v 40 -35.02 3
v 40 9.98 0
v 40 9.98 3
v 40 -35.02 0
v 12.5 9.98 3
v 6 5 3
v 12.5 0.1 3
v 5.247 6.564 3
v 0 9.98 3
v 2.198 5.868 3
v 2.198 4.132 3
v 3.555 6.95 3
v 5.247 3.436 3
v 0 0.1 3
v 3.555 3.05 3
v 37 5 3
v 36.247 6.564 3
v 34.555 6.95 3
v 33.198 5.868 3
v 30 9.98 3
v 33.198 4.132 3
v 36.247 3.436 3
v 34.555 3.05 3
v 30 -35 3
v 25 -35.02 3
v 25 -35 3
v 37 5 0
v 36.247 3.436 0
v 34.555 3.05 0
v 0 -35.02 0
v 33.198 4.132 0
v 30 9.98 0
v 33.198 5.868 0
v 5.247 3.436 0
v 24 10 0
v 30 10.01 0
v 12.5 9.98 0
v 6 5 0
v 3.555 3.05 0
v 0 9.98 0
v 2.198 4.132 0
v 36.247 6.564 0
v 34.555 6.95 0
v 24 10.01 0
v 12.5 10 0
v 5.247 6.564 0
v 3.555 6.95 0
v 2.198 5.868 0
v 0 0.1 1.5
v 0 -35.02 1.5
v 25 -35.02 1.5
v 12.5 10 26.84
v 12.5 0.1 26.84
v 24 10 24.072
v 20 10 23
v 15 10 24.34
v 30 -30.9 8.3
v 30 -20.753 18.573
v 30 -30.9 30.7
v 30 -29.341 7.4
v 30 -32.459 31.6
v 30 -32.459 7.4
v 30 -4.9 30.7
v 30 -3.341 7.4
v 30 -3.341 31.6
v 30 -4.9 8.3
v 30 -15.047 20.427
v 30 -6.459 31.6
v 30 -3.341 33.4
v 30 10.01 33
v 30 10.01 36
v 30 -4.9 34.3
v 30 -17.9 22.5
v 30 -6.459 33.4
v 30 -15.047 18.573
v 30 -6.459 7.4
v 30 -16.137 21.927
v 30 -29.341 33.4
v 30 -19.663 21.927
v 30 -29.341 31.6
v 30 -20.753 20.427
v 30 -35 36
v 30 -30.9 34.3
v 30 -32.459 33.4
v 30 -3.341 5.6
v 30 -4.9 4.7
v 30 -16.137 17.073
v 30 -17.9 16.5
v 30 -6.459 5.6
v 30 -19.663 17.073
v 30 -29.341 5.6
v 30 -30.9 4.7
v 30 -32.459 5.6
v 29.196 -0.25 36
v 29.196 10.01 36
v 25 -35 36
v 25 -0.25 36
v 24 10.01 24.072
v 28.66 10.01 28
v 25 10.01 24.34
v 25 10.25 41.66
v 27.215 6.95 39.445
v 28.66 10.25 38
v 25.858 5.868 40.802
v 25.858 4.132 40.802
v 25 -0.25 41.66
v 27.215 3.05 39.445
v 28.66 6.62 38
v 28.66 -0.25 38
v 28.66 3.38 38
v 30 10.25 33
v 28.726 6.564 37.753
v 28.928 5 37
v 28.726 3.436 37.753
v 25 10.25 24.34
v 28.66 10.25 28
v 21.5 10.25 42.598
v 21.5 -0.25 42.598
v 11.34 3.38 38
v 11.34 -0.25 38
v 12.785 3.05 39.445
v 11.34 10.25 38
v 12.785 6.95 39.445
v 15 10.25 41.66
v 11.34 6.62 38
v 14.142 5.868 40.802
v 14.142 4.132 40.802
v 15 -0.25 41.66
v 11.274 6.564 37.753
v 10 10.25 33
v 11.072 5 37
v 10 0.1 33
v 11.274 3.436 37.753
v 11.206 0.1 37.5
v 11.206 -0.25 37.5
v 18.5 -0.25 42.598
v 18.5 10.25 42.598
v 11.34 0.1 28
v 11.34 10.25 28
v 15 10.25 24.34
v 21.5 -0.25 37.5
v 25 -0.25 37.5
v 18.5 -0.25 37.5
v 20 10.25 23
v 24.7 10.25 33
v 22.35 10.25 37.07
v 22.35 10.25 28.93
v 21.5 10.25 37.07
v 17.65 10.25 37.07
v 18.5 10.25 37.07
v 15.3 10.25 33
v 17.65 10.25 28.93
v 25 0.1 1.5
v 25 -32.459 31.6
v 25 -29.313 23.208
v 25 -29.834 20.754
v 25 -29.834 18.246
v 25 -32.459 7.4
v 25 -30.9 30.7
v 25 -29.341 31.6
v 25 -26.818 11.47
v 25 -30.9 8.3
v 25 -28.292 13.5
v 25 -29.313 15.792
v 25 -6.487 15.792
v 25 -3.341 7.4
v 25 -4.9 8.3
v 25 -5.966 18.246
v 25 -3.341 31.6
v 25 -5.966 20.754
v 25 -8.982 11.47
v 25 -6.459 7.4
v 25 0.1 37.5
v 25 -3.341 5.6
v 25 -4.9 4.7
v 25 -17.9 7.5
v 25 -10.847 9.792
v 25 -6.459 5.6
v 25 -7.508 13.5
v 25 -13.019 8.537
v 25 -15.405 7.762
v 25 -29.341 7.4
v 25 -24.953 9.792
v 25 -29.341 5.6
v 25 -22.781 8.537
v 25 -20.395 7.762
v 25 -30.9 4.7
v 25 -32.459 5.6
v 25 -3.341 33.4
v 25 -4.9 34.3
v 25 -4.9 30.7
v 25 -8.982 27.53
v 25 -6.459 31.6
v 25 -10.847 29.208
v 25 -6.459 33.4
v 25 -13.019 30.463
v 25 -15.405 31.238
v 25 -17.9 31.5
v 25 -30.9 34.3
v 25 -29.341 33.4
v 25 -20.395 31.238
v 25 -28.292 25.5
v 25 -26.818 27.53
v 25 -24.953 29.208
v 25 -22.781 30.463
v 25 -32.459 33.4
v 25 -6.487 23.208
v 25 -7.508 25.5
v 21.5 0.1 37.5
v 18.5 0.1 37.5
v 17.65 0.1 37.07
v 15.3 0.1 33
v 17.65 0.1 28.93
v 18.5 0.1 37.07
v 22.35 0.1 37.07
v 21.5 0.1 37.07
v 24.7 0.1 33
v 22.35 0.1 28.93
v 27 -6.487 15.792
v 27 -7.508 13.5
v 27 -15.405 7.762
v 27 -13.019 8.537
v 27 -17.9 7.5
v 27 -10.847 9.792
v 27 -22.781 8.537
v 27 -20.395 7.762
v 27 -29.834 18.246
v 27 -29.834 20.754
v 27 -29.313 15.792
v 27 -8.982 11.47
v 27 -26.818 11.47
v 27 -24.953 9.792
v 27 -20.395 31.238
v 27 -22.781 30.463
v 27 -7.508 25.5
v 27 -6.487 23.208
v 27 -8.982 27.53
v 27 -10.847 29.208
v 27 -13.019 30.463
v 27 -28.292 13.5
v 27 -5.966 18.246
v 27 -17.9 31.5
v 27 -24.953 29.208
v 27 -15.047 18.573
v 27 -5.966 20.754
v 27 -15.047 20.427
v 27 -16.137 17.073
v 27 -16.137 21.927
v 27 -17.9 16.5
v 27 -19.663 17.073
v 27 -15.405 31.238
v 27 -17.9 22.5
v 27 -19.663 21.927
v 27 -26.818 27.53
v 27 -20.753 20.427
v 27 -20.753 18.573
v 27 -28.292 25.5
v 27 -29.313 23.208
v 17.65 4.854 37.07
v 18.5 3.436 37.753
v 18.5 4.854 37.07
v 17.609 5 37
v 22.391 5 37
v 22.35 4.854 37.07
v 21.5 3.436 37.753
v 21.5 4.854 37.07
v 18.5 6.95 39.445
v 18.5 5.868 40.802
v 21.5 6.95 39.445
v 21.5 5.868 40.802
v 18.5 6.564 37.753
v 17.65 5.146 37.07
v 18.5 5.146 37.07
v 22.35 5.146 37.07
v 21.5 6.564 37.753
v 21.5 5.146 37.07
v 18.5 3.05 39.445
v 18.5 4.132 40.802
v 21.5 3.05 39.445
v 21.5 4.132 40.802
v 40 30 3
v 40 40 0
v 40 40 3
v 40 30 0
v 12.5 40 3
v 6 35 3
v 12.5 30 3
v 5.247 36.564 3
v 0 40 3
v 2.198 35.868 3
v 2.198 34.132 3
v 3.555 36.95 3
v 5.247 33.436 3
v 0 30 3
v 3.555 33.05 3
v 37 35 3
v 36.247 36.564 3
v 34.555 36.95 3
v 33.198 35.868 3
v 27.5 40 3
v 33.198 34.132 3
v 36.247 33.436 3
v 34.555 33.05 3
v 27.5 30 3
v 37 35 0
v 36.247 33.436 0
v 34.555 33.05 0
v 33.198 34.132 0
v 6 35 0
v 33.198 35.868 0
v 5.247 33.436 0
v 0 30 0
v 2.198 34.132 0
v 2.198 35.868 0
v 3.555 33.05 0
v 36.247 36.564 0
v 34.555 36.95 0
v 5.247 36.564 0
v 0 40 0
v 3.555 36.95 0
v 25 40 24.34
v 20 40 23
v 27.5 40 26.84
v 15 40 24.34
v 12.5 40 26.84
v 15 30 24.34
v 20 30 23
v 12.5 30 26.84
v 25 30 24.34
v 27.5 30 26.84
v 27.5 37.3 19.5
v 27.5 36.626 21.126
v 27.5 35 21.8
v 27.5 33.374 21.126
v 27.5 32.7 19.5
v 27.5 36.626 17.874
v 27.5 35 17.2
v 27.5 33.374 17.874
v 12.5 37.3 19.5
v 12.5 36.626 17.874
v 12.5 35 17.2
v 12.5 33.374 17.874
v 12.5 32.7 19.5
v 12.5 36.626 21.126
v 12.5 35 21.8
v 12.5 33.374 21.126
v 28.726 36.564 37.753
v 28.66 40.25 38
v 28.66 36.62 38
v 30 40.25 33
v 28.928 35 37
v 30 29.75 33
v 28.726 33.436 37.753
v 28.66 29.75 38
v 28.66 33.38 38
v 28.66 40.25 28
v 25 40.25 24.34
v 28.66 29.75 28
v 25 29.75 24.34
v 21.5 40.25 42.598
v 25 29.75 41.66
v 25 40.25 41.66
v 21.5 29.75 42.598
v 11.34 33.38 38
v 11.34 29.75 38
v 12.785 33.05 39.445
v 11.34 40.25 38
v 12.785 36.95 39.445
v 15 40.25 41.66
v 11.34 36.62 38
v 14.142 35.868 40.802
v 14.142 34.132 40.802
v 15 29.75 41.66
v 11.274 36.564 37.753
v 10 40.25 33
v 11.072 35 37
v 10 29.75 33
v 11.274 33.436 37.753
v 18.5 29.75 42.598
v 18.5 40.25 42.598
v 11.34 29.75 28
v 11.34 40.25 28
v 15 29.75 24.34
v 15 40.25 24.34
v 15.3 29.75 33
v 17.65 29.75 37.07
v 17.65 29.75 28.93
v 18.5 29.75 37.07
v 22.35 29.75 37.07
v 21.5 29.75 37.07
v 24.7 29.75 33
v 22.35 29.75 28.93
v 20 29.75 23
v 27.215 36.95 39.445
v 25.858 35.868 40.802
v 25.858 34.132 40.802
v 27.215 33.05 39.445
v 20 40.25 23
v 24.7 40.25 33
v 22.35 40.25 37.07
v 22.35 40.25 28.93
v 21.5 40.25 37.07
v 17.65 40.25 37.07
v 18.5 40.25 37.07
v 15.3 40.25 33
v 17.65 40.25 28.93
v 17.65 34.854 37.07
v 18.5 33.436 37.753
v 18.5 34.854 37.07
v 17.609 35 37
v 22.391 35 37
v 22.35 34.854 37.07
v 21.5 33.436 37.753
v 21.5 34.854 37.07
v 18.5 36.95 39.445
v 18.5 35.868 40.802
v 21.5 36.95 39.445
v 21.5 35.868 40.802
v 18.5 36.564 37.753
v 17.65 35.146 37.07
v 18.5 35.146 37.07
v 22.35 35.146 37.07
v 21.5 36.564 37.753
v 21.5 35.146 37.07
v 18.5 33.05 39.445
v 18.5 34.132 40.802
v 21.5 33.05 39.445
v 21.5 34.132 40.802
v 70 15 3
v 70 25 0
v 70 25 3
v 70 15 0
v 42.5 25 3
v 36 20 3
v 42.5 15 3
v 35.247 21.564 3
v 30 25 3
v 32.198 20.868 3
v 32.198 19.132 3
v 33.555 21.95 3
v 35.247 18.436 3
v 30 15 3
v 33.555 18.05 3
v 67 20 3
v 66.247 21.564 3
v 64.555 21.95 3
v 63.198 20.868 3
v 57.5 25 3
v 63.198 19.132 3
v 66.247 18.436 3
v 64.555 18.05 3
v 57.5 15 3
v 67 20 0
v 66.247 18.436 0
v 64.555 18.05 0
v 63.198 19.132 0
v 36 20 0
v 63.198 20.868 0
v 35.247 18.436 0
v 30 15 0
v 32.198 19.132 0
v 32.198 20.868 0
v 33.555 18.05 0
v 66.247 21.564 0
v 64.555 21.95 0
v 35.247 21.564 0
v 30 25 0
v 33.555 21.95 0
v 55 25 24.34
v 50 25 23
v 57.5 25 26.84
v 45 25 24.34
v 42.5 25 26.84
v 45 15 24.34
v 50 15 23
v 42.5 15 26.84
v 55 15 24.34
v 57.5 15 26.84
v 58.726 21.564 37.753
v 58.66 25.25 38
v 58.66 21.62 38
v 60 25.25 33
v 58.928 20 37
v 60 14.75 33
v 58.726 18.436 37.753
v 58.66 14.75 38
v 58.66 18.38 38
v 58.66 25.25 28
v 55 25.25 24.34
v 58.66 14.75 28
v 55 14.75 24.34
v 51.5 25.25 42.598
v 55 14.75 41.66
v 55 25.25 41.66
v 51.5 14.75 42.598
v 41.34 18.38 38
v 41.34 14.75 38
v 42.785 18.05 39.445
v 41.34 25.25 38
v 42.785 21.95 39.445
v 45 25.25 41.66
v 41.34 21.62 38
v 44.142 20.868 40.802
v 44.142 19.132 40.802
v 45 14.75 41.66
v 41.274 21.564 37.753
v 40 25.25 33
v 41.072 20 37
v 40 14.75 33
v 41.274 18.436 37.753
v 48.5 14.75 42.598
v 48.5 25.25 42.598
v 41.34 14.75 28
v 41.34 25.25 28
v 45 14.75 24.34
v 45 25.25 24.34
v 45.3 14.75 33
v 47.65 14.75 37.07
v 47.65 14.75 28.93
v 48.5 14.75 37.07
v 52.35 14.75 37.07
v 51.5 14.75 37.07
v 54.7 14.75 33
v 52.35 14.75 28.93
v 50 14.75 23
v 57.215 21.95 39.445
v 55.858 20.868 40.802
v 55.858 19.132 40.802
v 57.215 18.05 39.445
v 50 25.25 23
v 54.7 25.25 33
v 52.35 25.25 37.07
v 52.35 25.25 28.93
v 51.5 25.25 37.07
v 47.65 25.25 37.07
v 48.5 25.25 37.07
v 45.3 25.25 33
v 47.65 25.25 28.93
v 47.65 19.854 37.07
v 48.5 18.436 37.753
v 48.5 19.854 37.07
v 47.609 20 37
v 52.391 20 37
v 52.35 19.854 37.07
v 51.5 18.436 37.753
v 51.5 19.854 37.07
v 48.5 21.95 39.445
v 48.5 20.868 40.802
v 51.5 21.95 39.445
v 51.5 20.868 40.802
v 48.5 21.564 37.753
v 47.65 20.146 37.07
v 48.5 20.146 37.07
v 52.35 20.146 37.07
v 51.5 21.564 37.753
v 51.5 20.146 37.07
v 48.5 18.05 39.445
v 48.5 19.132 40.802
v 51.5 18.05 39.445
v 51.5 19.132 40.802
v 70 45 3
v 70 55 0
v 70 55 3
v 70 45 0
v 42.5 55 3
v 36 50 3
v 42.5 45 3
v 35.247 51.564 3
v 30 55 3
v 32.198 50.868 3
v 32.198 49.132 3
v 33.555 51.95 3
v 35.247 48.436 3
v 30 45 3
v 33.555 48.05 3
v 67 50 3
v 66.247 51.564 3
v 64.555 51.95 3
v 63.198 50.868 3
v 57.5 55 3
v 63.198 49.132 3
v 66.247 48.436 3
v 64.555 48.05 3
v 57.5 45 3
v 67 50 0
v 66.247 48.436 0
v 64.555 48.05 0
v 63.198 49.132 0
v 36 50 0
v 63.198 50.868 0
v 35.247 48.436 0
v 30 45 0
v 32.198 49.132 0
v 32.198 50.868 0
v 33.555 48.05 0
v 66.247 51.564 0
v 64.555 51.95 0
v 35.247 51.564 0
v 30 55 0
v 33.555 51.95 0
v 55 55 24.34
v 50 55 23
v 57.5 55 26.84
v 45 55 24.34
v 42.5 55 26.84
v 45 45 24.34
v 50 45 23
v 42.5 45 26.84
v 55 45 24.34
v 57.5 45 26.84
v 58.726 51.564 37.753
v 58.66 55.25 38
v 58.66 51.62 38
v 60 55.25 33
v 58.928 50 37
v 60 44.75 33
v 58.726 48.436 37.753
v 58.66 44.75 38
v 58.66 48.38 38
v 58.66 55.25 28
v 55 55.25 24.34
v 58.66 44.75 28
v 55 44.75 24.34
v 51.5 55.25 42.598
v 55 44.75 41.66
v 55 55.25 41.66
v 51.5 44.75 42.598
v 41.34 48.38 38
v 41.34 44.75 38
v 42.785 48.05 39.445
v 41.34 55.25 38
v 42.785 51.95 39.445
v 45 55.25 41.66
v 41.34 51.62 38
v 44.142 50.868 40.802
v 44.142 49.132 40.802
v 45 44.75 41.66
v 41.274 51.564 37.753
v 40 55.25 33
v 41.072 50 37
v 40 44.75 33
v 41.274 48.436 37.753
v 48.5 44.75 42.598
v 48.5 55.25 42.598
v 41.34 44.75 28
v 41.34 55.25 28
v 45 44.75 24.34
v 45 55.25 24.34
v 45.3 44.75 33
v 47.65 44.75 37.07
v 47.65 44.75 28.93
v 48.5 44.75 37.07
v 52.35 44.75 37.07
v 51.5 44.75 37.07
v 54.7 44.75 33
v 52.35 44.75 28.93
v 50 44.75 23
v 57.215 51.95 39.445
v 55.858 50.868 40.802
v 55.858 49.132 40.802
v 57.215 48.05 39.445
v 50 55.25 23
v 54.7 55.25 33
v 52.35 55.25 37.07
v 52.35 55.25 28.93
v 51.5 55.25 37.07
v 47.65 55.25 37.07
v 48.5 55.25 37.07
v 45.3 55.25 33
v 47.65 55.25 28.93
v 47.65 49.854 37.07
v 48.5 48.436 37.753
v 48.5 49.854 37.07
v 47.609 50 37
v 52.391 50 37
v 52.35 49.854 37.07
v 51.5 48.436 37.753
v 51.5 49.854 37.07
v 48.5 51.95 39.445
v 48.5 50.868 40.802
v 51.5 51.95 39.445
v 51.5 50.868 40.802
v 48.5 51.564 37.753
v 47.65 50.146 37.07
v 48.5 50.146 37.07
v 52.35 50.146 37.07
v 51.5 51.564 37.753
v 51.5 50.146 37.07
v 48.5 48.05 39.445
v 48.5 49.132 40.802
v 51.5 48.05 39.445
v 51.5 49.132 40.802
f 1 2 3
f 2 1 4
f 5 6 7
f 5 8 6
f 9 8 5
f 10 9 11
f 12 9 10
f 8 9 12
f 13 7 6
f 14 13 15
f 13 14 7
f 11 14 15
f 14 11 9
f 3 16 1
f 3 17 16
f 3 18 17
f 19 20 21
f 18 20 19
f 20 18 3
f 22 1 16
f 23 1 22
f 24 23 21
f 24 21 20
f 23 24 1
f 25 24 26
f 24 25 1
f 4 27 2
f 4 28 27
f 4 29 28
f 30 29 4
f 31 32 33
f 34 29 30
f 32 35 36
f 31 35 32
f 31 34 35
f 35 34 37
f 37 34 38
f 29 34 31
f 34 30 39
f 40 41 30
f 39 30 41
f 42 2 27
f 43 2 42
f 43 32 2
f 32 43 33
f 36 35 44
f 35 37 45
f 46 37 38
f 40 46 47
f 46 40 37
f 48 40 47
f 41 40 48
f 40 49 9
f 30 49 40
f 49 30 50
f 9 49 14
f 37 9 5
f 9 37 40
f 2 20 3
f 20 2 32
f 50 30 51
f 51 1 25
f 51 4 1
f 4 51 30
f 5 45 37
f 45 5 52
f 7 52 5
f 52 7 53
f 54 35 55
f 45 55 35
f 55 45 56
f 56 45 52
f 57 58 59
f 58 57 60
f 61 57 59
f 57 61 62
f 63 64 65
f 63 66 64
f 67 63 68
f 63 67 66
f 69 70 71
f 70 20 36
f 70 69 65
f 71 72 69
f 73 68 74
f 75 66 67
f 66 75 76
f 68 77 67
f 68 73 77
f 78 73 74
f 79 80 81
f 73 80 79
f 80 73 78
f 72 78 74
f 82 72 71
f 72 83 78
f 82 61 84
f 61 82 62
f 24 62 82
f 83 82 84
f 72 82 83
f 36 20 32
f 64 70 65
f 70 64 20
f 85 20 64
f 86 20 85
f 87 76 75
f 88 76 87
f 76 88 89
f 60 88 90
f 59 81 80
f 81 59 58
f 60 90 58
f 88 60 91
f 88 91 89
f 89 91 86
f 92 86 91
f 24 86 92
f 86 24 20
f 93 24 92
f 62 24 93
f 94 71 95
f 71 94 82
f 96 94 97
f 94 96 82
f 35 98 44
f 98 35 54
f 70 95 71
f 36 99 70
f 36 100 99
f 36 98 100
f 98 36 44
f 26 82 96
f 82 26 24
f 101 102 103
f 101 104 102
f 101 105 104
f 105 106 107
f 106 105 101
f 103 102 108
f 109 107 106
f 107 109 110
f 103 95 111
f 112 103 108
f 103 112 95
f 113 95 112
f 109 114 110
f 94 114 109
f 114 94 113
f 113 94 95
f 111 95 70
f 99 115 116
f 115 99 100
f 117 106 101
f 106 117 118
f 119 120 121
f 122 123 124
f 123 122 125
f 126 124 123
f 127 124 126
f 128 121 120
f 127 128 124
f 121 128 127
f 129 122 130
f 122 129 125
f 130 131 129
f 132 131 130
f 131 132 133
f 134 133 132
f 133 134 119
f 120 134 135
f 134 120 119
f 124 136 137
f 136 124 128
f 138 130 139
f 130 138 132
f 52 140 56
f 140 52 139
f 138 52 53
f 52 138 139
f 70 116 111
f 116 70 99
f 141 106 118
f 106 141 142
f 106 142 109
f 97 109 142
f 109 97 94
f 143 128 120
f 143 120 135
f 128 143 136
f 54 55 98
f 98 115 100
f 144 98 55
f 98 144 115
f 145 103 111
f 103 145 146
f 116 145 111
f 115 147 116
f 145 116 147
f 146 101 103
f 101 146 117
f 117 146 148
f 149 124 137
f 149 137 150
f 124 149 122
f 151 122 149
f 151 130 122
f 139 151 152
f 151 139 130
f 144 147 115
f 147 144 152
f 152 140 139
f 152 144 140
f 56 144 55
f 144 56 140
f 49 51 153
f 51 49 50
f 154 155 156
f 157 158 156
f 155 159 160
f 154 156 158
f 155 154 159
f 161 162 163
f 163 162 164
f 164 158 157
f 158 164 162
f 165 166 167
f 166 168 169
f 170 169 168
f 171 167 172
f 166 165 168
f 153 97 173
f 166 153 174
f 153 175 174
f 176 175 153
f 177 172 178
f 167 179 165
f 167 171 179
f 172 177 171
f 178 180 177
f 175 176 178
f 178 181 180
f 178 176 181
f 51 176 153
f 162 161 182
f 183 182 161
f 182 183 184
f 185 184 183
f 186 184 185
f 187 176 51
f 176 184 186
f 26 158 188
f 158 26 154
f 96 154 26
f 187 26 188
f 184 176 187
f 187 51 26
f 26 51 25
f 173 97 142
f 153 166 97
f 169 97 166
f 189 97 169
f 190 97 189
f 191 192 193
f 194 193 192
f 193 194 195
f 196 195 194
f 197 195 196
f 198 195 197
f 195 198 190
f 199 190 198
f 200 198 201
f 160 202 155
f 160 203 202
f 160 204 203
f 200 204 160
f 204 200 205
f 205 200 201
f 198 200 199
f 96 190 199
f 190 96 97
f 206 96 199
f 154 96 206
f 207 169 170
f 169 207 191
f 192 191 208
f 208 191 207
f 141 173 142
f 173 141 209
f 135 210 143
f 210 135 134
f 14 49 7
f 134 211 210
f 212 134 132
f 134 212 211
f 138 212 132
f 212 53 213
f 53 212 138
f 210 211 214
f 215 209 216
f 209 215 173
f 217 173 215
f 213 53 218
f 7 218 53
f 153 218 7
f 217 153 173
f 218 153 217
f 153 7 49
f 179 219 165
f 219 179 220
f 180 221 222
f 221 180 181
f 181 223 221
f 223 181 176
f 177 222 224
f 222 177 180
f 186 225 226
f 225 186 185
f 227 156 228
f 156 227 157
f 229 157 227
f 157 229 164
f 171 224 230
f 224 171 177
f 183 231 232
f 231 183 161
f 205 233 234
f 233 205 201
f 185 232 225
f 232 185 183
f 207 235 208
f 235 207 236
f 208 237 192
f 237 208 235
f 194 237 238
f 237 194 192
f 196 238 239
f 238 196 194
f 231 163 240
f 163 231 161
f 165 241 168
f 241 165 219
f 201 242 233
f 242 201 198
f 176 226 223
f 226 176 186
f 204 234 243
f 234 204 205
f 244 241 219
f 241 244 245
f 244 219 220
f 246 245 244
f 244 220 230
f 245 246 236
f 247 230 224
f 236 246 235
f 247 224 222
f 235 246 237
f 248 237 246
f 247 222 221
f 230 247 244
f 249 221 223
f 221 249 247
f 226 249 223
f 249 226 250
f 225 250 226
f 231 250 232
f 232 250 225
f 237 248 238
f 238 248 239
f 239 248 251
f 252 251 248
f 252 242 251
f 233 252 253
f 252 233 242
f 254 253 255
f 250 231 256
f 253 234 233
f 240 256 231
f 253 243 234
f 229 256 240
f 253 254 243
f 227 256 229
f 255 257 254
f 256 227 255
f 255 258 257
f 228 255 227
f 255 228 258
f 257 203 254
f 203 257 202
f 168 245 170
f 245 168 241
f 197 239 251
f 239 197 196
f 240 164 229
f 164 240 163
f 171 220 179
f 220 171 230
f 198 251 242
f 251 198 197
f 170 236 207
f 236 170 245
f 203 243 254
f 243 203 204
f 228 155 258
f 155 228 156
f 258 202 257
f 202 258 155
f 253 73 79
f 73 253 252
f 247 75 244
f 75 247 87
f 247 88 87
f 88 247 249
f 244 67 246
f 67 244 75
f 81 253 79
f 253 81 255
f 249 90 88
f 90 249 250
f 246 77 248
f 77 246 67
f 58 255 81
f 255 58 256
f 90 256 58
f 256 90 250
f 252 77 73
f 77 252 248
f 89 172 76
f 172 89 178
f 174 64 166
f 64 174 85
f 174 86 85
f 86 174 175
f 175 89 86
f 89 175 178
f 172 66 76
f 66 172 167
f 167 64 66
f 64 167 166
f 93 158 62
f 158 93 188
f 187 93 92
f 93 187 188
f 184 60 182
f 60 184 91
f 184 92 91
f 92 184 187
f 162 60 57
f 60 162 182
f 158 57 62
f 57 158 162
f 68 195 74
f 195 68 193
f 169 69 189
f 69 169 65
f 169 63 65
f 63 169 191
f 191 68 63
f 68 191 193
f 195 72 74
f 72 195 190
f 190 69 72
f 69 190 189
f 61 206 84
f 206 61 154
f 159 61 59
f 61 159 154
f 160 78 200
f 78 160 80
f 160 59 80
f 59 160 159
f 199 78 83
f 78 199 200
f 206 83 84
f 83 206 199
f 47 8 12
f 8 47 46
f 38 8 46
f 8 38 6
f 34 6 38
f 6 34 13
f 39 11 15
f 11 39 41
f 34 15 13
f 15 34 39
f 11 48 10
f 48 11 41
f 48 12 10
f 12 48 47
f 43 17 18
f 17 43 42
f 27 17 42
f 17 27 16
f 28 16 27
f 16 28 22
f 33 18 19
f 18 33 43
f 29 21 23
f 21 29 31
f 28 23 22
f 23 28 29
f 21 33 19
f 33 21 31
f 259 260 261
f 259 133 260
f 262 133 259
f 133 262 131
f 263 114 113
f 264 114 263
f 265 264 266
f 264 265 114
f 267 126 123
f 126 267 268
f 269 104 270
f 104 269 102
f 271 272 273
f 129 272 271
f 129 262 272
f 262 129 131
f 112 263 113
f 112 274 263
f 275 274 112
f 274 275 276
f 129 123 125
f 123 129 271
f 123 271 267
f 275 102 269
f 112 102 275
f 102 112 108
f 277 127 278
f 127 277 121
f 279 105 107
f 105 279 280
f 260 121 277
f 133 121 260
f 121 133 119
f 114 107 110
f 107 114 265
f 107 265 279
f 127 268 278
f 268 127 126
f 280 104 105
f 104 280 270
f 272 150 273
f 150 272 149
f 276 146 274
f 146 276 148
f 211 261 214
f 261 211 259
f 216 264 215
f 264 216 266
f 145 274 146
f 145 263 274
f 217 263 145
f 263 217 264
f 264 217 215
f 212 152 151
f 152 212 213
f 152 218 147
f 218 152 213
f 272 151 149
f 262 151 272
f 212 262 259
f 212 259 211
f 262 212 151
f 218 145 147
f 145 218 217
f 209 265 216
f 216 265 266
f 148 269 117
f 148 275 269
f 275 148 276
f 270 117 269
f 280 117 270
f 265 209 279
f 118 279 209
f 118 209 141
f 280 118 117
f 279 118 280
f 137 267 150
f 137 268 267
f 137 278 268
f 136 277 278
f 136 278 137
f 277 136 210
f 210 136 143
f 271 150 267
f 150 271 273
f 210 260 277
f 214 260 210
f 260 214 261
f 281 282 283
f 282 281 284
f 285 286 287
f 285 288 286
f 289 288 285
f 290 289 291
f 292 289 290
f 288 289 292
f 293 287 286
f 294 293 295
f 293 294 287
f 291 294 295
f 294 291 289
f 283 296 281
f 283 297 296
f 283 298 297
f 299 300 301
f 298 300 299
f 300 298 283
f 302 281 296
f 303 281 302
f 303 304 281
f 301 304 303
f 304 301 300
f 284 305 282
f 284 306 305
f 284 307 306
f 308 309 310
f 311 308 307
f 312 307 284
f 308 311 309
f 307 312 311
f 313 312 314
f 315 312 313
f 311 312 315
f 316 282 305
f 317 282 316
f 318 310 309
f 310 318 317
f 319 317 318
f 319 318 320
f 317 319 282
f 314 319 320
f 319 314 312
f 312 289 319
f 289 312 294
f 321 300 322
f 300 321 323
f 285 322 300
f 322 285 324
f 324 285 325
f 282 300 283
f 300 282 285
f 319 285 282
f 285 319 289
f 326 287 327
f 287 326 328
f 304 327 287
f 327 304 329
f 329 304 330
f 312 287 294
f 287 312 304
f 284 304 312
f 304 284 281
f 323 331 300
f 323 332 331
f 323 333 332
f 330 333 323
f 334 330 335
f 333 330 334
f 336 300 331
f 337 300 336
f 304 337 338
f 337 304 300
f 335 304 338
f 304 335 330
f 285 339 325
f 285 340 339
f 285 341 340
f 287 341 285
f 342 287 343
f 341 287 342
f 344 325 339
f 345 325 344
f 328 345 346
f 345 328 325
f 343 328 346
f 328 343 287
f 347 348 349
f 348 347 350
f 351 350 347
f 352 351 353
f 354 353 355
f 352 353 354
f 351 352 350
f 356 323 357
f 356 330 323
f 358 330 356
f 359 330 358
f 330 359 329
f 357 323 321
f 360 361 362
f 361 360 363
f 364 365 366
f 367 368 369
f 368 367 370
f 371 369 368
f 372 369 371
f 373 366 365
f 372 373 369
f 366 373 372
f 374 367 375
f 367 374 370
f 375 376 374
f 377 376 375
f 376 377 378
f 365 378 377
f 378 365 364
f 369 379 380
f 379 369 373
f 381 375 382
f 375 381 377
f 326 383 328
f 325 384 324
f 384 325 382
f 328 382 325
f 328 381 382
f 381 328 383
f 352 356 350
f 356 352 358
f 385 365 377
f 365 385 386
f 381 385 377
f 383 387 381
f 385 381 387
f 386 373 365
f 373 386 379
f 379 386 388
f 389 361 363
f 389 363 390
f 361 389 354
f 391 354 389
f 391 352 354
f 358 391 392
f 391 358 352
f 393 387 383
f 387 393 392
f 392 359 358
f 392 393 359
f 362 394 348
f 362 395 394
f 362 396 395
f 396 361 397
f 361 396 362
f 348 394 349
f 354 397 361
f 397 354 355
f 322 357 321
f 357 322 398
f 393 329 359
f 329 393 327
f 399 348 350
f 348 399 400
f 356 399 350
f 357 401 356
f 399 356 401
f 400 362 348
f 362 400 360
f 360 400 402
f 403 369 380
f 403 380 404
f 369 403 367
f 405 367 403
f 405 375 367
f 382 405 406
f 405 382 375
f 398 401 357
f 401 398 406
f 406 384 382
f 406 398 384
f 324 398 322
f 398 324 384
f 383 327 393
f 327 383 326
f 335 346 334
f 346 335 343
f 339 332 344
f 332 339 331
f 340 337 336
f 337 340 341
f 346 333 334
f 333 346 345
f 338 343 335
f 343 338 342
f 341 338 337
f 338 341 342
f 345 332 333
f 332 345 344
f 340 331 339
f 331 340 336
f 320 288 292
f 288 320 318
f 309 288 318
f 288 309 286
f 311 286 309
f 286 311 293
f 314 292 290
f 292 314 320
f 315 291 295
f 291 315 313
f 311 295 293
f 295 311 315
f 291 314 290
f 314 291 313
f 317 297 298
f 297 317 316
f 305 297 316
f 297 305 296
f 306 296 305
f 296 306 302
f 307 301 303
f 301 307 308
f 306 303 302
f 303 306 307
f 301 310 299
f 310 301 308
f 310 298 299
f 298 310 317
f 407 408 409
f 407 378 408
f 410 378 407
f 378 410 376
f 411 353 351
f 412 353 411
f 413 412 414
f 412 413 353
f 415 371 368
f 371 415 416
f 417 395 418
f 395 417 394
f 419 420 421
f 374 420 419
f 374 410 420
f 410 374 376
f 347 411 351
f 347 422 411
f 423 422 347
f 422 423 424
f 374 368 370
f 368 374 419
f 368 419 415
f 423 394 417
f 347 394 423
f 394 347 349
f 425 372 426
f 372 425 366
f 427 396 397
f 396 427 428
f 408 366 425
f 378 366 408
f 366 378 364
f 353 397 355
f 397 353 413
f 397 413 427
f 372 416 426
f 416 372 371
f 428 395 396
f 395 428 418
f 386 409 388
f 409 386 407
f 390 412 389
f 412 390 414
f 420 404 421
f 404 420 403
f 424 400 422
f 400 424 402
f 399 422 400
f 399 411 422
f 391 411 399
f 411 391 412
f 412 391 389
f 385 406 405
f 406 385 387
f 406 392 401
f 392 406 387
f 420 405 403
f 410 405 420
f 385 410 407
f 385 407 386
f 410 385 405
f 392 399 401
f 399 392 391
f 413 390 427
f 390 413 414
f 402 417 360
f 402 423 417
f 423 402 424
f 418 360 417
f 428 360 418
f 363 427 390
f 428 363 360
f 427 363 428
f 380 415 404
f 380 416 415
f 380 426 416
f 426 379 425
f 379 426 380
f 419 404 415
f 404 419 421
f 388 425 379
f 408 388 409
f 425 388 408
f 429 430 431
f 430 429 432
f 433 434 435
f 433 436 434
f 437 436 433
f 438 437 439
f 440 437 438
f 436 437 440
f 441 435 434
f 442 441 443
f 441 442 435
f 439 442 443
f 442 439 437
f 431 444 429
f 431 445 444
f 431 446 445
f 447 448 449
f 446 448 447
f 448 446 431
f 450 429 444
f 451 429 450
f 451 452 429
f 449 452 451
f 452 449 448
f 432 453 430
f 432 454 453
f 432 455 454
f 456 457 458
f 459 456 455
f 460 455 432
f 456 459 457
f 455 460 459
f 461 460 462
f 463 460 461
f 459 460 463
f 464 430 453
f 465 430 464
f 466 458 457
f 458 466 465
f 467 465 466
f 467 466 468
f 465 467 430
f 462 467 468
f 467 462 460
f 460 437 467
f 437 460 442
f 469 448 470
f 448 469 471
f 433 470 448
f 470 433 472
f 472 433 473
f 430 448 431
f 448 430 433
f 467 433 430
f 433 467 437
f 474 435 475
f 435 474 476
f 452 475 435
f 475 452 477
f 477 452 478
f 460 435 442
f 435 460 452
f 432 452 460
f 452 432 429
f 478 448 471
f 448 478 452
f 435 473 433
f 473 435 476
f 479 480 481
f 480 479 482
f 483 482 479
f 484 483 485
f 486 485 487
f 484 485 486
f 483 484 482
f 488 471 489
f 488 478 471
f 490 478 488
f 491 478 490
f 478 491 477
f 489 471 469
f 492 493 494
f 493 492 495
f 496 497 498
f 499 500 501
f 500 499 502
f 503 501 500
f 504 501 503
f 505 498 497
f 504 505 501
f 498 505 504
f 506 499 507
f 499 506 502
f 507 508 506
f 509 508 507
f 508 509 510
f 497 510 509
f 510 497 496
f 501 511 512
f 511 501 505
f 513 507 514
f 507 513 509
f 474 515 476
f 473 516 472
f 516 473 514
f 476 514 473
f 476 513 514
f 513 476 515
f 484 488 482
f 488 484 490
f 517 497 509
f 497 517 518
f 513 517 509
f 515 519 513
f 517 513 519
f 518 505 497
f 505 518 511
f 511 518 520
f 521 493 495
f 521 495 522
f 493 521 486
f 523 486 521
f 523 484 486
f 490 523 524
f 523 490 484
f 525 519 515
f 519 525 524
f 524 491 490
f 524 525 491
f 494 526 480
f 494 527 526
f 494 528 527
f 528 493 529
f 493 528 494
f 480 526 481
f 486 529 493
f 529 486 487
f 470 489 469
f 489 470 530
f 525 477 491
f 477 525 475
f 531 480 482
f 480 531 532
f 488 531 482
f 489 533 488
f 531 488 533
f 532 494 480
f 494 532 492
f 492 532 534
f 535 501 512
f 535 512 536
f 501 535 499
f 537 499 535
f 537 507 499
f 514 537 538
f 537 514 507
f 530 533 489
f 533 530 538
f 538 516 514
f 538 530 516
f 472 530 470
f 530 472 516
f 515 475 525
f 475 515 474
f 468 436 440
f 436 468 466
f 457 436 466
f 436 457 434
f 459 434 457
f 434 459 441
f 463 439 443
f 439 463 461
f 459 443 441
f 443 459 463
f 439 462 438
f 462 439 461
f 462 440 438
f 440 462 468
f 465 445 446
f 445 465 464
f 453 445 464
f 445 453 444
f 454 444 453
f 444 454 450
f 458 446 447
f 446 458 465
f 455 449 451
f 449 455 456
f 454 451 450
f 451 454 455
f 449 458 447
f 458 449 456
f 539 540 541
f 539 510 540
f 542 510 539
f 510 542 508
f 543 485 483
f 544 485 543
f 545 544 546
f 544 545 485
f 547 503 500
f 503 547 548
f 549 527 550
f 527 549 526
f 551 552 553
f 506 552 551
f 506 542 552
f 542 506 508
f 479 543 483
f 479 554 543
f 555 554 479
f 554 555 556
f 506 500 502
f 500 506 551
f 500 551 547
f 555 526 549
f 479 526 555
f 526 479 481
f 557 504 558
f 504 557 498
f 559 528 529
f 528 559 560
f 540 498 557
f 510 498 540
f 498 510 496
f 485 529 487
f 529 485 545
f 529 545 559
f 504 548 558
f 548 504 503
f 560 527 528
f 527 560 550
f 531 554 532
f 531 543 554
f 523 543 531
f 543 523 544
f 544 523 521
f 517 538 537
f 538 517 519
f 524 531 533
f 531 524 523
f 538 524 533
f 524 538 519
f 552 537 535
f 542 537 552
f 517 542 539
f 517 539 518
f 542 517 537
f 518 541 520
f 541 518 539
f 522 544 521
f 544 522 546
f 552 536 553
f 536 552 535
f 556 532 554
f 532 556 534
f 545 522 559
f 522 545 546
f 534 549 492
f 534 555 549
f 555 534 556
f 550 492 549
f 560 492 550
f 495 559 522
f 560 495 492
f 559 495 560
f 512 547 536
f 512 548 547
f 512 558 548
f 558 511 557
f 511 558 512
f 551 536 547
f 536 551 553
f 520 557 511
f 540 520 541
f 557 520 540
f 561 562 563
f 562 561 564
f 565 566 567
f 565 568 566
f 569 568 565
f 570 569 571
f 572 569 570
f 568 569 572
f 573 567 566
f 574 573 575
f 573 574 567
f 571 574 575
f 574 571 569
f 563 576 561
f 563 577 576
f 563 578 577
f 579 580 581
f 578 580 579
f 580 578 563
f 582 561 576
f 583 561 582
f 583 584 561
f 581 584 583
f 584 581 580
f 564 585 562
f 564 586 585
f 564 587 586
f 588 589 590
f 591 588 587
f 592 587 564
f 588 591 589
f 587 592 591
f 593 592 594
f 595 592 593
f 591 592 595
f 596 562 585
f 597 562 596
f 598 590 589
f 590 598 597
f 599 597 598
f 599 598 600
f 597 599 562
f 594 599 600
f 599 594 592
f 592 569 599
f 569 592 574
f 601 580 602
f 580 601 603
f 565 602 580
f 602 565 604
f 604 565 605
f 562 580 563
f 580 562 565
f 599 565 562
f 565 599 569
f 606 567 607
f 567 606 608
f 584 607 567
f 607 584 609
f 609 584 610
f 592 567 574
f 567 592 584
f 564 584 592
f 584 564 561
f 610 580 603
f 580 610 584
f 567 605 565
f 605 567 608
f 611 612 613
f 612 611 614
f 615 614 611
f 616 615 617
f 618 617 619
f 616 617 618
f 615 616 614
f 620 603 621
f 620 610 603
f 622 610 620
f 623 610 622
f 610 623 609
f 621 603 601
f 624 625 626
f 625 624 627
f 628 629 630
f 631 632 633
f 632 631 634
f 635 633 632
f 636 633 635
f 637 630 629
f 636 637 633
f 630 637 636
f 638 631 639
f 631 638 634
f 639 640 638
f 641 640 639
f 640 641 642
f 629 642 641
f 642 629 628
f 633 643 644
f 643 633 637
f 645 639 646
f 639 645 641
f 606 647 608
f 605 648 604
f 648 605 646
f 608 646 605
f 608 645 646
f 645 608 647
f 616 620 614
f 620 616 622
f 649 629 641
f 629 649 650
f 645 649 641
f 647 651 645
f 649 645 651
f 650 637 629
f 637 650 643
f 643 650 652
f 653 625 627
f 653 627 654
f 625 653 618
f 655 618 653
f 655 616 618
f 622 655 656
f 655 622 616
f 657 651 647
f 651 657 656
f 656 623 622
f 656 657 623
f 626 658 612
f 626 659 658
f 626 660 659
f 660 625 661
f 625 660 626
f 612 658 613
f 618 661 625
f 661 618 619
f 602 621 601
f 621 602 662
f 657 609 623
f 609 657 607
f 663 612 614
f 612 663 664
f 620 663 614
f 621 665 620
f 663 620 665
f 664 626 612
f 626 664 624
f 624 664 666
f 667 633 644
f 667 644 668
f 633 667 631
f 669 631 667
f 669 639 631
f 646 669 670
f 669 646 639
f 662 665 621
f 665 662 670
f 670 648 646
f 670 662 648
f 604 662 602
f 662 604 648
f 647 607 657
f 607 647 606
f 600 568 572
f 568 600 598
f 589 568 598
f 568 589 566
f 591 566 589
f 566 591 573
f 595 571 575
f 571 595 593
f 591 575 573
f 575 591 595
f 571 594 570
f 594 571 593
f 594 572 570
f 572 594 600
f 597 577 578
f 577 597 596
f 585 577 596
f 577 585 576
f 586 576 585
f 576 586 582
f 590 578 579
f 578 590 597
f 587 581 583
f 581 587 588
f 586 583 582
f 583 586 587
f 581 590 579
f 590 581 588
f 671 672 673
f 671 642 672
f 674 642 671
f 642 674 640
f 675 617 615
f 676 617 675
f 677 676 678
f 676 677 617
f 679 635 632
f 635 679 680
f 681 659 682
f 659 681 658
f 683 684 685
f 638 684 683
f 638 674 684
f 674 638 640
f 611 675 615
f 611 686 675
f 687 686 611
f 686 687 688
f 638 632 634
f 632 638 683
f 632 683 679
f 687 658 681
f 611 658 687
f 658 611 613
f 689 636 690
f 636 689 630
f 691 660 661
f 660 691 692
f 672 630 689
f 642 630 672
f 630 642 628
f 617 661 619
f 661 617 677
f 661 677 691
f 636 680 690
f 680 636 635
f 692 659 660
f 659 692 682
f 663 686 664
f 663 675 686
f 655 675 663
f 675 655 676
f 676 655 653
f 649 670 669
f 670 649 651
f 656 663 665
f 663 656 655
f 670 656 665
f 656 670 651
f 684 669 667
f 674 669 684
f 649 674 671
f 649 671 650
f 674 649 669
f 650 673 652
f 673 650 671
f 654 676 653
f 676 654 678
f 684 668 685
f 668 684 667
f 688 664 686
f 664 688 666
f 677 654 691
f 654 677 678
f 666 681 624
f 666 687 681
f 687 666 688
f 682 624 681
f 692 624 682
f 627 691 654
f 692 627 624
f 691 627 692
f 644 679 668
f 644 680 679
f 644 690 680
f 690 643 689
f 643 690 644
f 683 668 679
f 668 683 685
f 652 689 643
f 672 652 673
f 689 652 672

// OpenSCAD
module nema14(){
cube([36,36,40],true);
translate([0,0,1])cylinder(r=12,h=42,center=true);
translate([0,0,1])cylinder(r=3,h=38);
translate([13,13,1])cylinder(r=1.8,h=38);
translate([13,-13,1])cylinder(r=1.8,h=38);
translate([-13,13,1])cylinder(r=1.8,h=38);
translate([-13,-13,1])cylinder(r=1.8,h=38);

}

module shaftholder(){
difference(){
union(){cube([40,10,3]);
translate([12.5,0])cube([15,10,30]);
translate([20,10.25,20+13])rotate([90,0,0])cylinder(r=10,h=10.5,$fn=12);

}
translate([4,5,-0.1])cylinder(r=2,h=10);
translate([35,5,-0.1])cylinder(r=2,h=10);
translate([5,5,26+13])rotate([0,90,0])cylinder(r=2,h=30);
translate([20,10.5,20+13])rotate([90,0,0])cylinder(r=4.7,h=11,$fn=6);
translate([18.5,-2.1,20+13])rotate([0,0,0])cube([3,13,30]);

}
}
module ishaftholder(){
difference(){
union(){cube([40,10,3]);
translate([12.5,0])cube([15,10,30]);
translate([20,10.25,20+13])rotate([90,0,0])cylinder(r=10,h=10.5,$fn=12);

}
translate([5,5,19.5])rotate([0,90,0])cylinder(r=2.3,h=30);
translate([4,5,-0.1])cylinder(r=2,h=10);
translate([35,5,-0.1])cylinder(r=2,h=10);
translate([5,5,26+13])rotate([0,90,0])cylinder(r=2,h=30);
translate([20,10.5,20+13])rotate([90,0,0])cylinder(r=4.7,h=11,$fn=6);
translate([18.5,-2.1,20+13])rotate([0,0,0])cube([3,13,30]);

}
}


module mshaftholder(){
difference(){
union(){translate([0,-35.02])cube([40,45,3]);
translate([12.5,0])cube([15,10,30]);
#translate([24,-35,0])cube([6,45.01,36]);
translate([20,10.25,20+13])rotate([90,0,0])cylinder(r=10,h=10.5,$fn=12);

}
translate([4,5,-0.1])cylinder(r=2,h=10);
translate([35,5,-0.1])cylinder(r=2,h=10);
translate([5,5,26+13])rotate([0,90,0])cylinder(r=2,h=30);
translate([20,10.5,20+13])rotate([90,0,0])cylinder(r=4.7,h=11,$fn=6);
translate([18.5,-2.1,20+13])rotate([0,0,0])cube([3,13,30]);
#translate([5,-17.9,19.5])rotate([0,90,0])nema14();

}
}


mshaftholder();
translate([0,30,0])ishaftholder();
translate([30,15,0])shaftholder();
translate([30,45,0])shaftholder();

%cube([200,200,0.01],true);
